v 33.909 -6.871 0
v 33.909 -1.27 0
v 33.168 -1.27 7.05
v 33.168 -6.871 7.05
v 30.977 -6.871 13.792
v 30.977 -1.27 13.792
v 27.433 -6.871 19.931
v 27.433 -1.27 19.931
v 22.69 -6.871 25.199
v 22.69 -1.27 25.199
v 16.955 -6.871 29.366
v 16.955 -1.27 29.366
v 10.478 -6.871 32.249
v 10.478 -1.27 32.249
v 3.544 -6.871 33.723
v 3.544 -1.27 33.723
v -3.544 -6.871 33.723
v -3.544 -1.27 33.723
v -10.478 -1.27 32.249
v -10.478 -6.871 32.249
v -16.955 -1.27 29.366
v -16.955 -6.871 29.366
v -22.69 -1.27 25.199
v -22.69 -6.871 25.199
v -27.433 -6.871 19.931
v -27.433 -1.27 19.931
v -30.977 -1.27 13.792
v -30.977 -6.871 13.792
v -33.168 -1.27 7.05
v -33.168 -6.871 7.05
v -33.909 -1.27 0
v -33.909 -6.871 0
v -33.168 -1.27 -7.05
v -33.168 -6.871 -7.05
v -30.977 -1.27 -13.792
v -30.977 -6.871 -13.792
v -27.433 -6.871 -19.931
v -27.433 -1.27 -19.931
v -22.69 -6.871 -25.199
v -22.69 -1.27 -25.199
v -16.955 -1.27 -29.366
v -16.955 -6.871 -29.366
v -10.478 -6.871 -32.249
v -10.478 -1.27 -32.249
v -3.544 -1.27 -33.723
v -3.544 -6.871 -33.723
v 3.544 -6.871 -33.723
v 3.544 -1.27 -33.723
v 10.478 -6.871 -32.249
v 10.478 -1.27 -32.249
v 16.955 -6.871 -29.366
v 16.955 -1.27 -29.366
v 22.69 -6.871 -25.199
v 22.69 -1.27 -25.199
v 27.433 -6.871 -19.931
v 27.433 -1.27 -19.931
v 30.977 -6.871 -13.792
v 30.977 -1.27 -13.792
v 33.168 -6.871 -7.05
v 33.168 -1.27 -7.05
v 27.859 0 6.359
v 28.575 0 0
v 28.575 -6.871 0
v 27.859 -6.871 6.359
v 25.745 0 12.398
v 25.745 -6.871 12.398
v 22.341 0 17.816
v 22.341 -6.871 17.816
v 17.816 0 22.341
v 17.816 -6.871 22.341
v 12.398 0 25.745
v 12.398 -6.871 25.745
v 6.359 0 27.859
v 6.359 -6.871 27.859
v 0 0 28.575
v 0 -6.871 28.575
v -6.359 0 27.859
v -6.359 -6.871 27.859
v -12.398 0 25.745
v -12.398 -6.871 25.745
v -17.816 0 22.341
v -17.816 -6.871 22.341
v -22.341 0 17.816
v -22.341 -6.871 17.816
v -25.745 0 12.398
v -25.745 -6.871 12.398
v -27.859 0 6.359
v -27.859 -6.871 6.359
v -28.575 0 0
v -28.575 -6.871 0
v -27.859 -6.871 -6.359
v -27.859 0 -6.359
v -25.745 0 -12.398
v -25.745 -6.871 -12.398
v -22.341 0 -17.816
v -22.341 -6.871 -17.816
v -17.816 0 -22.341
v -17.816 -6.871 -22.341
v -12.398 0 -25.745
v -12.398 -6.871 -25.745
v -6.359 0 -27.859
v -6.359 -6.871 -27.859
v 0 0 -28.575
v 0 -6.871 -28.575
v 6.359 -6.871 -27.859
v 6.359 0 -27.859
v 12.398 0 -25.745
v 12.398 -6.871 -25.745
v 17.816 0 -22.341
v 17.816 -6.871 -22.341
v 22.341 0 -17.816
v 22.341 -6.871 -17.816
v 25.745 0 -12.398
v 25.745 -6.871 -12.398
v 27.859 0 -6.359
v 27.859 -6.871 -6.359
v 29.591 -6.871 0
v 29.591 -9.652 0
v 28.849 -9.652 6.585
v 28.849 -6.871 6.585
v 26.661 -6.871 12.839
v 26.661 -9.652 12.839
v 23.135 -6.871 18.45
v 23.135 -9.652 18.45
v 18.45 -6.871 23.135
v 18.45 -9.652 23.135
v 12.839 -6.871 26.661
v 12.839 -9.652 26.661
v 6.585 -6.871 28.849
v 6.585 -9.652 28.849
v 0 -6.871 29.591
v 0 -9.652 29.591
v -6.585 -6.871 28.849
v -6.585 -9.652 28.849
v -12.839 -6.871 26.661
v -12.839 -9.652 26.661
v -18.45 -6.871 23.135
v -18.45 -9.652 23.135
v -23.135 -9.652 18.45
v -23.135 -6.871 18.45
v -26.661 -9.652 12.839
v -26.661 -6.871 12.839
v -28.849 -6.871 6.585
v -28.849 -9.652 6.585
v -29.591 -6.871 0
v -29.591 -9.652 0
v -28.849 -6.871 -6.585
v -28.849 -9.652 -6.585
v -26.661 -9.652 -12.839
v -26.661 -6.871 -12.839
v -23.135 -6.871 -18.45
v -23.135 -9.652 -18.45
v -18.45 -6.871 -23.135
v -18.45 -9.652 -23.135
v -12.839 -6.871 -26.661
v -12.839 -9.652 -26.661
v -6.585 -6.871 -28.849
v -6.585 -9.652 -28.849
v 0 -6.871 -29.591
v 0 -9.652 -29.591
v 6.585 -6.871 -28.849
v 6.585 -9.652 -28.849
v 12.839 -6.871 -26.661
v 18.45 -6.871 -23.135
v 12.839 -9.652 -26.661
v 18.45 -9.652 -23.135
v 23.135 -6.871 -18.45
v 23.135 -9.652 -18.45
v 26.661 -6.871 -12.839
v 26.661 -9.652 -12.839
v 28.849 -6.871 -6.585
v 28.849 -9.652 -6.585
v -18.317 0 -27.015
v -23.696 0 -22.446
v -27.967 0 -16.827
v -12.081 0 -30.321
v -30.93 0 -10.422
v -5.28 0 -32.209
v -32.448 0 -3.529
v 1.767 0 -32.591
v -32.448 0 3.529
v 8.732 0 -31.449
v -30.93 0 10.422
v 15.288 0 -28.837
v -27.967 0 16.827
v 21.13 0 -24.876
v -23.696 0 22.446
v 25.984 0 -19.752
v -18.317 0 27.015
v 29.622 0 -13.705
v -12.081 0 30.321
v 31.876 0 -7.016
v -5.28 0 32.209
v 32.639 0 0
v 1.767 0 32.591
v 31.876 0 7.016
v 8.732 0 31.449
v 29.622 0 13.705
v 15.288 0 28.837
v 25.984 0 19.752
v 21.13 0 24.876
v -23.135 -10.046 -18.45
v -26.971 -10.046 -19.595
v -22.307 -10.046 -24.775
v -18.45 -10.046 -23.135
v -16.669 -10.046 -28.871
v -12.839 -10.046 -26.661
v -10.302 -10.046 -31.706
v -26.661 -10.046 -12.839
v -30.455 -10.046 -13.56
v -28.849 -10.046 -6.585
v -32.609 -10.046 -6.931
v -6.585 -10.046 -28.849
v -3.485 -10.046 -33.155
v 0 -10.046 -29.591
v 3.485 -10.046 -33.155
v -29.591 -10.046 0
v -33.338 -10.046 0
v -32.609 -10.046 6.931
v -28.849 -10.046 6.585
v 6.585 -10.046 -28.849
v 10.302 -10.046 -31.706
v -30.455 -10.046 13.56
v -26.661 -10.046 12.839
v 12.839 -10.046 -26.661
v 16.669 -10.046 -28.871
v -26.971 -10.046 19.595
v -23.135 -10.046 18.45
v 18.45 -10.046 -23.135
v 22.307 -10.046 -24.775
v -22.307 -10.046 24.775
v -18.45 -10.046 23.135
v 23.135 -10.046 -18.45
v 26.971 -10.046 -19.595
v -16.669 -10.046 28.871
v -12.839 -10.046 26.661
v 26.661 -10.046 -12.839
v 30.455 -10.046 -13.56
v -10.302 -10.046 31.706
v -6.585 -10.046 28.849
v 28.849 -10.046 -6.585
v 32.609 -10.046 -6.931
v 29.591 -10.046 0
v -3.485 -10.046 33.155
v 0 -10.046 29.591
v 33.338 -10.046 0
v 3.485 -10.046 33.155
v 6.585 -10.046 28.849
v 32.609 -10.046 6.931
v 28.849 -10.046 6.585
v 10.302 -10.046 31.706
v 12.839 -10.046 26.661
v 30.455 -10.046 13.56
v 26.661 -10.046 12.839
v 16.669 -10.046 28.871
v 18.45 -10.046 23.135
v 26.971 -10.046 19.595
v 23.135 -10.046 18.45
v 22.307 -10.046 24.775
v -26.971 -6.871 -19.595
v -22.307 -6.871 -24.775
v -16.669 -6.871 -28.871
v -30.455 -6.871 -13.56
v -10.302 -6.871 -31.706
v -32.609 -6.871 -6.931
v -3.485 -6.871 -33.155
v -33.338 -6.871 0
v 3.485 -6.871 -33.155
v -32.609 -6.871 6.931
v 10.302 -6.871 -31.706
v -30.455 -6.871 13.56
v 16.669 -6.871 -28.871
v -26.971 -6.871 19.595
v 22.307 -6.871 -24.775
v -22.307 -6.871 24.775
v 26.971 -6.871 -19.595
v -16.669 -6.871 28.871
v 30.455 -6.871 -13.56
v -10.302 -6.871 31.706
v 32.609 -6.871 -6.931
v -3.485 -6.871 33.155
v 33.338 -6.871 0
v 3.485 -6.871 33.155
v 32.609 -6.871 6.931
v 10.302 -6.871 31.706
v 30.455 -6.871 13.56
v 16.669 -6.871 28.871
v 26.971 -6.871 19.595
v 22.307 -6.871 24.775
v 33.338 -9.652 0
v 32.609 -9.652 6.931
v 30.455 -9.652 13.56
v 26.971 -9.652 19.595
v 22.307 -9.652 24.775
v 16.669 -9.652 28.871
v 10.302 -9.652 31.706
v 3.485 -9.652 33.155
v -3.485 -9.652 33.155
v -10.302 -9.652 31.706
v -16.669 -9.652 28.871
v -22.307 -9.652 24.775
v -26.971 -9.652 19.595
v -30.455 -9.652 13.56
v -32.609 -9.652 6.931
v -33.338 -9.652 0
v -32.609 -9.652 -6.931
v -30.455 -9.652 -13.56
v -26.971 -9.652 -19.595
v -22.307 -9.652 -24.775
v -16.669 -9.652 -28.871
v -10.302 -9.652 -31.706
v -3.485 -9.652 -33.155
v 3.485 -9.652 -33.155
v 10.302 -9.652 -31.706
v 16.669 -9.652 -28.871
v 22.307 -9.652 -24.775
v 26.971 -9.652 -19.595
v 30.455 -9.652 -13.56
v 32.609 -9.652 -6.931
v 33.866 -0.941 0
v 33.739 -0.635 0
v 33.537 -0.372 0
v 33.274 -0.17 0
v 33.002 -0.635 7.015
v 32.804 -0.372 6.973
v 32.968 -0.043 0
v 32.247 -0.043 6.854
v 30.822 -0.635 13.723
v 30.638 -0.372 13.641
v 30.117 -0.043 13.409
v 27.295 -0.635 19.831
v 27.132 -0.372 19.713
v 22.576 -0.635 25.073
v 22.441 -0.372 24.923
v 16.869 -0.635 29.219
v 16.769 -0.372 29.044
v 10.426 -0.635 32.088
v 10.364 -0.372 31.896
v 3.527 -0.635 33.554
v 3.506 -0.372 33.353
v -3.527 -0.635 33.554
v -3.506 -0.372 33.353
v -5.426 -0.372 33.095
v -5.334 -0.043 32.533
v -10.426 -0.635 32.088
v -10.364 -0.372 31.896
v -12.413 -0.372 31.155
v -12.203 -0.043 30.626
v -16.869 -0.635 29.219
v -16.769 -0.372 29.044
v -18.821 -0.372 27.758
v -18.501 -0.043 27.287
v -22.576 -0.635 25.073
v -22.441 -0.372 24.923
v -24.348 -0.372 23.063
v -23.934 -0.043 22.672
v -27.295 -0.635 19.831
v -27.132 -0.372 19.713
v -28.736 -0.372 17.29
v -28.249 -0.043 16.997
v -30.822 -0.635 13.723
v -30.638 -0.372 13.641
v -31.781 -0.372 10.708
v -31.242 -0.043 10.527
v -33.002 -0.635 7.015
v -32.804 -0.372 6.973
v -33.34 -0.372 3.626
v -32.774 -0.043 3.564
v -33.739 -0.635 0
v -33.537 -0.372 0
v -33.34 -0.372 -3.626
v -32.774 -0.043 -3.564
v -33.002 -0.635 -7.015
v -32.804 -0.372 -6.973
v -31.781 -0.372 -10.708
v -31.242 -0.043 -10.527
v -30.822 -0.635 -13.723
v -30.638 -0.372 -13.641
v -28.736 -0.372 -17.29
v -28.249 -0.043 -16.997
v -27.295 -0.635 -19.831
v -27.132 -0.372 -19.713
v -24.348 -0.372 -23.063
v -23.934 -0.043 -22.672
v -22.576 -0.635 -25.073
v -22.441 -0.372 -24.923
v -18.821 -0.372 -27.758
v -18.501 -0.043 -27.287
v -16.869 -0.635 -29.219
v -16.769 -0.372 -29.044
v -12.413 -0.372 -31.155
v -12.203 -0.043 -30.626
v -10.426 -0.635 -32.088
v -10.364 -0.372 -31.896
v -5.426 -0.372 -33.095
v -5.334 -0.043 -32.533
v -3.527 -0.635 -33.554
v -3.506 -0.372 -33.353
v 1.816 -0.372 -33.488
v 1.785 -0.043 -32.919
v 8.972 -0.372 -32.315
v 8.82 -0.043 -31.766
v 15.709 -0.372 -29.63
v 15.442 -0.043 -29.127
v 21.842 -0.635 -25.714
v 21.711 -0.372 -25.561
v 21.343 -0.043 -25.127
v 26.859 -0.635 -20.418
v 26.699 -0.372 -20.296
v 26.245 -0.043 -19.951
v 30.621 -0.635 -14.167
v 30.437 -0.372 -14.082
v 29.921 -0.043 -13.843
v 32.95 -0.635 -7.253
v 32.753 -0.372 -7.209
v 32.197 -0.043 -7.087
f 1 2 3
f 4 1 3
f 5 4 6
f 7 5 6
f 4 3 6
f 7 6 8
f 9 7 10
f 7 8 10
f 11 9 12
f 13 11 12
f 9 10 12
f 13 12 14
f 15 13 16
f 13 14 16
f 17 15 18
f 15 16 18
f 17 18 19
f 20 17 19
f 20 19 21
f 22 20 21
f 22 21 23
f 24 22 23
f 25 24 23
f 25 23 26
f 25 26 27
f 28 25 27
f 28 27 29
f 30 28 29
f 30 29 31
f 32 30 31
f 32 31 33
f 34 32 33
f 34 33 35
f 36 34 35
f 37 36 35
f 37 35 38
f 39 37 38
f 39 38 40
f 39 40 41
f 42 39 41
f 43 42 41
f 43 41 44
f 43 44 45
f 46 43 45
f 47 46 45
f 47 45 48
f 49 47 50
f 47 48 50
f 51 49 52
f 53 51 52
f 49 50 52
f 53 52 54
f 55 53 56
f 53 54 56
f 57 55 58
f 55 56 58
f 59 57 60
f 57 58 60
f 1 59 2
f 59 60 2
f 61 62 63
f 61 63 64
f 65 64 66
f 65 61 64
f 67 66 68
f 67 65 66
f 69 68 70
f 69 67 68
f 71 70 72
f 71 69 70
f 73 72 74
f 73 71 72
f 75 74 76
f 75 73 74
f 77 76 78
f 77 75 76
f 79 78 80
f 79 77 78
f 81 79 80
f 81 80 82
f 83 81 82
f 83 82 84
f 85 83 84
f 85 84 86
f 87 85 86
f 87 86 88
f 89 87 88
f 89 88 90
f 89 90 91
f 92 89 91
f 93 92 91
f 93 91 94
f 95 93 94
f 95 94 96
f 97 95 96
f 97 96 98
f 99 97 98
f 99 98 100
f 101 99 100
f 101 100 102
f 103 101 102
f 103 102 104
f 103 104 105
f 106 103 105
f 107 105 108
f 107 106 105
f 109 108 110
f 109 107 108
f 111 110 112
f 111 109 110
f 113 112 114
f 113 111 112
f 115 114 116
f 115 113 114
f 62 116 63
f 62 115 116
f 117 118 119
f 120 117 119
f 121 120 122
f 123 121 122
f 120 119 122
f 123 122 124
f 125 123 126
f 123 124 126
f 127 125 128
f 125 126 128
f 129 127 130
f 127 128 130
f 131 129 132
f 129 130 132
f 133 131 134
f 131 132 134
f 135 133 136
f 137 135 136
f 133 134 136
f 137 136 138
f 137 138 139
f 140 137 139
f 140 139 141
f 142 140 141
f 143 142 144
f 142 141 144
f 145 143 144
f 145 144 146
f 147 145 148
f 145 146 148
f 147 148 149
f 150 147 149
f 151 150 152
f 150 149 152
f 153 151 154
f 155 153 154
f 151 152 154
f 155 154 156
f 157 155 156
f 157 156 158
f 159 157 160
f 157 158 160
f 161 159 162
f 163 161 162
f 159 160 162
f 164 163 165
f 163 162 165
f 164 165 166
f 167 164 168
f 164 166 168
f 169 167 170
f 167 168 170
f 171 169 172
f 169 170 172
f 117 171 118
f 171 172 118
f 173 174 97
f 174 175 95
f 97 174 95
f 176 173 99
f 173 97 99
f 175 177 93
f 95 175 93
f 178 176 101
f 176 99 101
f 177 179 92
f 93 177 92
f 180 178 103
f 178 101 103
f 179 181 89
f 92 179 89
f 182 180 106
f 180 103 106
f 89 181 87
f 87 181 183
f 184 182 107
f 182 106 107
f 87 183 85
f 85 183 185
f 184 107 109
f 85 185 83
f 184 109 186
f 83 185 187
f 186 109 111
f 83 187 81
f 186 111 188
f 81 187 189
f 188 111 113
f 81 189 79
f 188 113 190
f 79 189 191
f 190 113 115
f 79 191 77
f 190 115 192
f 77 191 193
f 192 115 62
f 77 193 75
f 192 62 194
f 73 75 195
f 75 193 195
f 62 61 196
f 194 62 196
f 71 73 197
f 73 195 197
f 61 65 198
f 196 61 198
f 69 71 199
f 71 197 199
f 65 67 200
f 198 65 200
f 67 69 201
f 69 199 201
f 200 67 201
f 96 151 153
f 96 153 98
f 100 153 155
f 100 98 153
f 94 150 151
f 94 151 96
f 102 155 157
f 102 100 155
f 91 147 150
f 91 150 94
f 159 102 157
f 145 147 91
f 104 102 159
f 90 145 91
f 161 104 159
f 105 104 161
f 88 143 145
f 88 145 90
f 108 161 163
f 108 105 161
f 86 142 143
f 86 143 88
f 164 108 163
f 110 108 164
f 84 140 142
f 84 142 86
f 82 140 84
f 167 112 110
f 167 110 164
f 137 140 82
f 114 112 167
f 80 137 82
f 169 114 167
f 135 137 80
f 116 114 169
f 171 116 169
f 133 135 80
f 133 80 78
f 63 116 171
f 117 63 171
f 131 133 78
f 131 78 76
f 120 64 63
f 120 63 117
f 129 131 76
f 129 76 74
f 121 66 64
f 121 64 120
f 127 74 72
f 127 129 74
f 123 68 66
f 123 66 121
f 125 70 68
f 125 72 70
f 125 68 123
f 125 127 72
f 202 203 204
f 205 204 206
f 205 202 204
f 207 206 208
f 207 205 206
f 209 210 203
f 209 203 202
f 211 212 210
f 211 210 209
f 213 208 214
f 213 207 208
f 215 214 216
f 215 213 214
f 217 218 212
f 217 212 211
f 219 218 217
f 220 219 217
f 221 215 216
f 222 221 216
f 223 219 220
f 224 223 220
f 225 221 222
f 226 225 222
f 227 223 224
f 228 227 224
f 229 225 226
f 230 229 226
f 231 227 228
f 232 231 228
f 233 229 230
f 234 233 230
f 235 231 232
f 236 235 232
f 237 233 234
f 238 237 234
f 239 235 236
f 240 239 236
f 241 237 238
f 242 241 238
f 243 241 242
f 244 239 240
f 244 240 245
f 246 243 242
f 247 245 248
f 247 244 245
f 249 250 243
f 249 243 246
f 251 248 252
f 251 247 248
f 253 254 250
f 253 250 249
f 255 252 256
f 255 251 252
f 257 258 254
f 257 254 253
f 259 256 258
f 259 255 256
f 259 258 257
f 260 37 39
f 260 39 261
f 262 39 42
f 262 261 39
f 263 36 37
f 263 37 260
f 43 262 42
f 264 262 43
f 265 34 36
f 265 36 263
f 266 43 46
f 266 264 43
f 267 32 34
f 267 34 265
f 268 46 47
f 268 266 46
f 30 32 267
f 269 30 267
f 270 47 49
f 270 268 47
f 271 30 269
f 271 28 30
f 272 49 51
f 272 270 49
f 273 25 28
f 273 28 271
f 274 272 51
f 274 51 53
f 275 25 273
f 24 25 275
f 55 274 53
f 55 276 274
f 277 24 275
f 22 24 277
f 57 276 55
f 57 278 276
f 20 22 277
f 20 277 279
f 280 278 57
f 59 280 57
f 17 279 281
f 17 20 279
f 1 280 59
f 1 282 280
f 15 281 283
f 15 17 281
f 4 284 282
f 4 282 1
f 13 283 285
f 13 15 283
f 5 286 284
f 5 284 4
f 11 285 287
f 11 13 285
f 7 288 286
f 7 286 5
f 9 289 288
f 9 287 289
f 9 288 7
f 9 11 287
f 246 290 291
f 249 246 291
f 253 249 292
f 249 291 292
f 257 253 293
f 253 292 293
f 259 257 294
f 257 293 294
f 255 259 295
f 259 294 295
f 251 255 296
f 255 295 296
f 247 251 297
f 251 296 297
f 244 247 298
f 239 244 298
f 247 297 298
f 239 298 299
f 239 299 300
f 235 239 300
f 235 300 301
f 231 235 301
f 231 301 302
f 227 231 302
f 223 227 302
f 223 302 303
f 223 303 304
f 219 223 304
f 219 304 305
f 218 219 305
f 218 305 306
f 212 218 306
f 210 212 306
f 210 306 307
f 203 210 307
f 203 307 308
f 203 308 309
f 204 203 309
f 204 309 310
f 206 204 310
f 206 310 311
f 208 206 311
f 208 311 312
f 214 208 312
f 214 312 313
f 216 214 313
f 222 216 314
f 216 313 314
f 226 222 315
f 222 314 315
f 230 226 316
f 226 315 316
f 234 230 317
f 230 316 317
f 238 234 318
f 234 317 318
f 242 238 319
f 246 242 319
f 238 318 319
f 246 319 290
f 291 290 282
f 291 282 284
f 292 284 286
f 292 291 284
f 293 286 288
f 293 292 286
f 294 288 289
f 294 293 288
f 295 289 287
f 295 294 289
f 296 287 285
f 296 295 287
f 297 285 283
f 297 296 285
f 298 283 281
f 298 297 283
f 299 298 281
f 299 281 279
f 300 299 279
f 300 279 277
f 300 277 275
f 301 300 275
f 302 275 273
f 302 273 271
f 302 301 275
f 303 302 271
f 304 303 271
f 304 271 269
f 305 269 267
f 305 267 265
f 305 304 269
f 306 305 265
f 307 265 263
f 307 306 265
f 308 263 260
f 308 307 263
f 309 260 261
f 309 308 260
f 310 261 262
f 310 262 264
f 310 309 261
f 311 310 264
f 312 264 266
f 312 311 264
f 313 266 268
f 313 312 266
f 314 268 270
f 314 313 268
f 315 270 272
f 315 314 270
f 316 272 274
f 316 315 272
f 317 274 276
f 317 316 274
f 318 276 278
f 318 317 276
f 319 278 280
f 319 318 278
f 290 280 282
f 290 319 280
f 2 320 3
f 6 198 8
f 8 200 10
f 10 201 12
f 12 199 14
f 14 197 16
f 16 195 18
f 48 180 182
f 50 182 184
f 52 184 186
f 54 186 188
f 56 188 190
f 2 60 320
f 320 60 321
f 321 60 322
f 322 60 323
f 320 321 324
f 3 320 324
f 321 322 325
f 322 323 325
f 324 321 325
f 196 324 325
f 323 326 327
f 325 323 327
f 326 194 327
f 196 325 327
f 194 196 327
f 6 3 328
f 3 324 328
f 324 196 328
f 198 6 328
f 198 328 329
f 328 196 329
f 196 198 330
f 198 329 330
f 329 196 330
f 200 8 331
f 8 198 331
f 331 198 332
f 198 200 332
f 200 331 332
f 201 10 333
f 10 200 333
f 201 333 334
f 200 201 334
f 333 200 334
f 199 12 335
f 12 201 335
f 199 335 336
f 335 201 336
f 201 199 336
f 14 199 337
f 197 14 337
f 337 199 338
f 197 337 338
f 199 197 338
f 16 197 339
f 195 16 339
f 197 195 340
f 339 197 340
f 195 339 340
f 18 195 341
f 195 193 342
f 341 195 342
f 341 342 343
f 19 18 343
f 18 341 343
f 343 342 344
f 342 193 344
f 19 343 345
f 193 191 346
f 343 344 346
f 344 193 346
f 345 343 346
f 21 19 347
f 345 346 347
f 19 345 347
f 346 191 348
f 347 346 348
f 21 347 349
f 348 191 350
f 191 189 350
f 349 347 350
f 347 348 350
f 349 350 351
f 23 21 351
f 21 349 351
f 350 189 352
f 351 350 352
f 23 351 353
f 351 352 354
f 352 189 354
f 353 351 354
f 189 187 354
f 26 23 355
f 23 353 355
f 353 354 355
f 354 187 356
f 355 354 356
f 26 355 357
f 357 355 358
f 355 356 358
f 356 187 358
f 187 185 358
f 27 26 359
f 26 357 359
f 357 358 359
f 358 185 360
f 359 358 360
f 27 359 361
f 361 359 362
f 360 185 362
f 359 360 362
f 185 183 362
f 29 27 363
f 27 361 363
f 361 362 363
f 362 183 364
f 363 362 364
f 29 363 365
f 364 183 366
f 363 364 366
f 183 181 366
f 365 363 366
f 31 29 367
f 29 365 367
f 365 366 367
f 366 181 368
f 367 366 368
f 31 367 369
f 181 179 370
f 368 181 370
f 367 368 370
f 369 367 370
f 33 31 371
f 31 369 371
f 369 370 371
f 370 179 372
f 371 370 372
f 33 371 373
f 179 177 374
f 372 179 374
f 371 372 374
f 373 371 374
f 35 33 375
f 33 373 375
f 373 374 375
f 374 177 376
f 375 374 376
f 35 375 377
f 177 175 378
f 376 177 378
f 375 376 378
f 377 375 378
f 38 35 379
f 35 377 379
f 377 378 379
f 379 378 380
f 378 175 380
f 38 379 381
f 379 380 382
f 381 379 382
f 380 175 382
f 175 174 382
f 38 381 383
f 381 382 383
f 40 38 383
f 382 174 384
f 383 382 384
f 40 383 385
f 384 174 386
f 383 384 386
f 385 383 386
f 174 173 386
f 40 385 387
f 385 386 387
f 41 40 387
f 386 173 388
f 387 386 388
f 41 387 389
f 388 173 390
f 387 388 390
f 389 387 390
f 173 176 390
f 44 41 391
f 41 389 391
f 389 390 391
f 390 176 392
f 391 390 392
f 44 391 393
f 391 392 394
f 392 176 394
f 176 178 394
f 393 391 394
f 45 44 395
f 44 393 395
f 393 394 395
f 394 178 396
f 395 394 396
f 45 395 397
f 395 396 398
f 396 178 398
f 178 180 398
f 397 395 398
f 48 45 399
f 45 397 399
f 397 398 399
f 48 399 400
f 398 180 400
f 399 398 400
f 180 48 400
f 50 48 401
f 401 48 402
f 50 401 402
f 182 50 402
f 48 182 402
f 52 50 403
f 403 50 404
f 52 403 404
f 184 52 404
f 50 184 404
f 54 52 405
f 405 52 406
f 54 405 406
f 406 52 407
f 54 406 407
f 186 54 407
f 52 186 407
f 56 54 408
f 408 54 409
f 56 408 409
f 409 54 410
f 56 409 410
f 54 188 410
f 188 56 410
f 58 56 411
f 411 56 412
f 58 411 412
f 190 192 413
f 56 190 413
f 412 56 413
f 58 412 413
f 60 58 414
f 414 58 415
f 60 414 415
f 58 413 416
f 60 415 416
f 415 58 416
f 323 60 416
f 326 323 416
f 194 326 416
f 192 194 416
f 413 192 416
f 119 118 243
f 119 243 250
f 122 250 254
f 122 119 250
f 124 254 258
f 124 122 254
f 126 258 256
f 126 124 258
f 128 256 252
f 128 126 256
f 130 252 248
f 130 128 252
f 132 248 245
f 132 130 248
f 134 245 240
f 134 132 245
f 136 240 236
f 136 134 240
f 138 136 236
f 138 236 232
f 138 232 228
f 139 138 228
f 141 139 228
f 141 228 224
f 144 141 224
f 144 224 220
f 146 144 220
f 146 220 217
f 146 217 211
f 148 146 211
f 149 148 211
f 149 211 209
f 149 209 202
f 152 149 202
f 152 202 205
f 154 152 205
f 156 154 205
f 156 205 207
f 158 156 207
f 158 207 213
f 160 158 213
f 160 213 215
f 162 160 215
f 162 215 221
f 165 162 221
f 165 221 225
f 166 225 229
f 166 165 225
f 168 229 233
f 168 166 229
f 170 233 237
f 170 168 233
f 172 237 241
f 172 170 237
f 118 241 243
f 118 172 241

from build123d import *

# Parameters (mm, degrees)
F0_R     = 33.909
F0_R_2   = 28.575
F1_DEPTH = 9.652
F2_R     = 33.3375
F2_R_2   = 29.591
F3_DEPTH = 4.699
F4_R     = 1.27
F5_DEPTH = 1.5367
F6_DEPTH = 2.7686
F7_DEPTH = 2.7813


with BuildPart() as f1:
    # F0 (on Front) → F1 (new body)
    with BuildSketch(Plane.XZ):
        Circle(F0_R)
        Circle(F0_R_2, mode=Mode.SUBTRACT)
    extrude(amount=F1_DEPTH)

    # F2 (on face) → F3 (join)
    with BuildSketch(Plane.XZ.offset(9.652)):
        Circle(F2_R)
        Circle(F2_R_2, mode=Mode.SUBTRACT)
    extrude(amount=F3_DEPTH)

    # F4
    f4_edges = [f1.edges().sort_by_distance(p)[0] for p in [
        (-33.909, 0, 0),
    ]]
    fillet(f4_edges, radius=F4_R)

    # F5 (cut): a face of the model
    f5_faces = [f1.faces().sort_by_distance(p)[0] for p in [
        (-32.3945731073, -14.351, 0),
    ]]
    extrude(f5_faces, amount=-F5_DEPTH, mode=Mode.SUBTRACT)

    # F6 (cut): a face of the model
    f6_faces = [f1.faces().sort_by_distance(p)[0] for p in [
        (-32.3945731073, -12.8143, 0),
    ]]
    extrude(f6_faces, amount=-F6_DEPTH, mode=Mode.SUBTRACT)

    # F7 (cut): faces of the model
    f7_faces = [f1.faces().sort_by_distance(p)[0] for p in [
        (-33.8130908646, -9.652, 0),
        (-28.7540401295, -9.652, 0),
    ]]
    extrude(f7_faces, amount=-F7_DEPTH, mode=Mode.SUBTRACT)


solid = f1.part
